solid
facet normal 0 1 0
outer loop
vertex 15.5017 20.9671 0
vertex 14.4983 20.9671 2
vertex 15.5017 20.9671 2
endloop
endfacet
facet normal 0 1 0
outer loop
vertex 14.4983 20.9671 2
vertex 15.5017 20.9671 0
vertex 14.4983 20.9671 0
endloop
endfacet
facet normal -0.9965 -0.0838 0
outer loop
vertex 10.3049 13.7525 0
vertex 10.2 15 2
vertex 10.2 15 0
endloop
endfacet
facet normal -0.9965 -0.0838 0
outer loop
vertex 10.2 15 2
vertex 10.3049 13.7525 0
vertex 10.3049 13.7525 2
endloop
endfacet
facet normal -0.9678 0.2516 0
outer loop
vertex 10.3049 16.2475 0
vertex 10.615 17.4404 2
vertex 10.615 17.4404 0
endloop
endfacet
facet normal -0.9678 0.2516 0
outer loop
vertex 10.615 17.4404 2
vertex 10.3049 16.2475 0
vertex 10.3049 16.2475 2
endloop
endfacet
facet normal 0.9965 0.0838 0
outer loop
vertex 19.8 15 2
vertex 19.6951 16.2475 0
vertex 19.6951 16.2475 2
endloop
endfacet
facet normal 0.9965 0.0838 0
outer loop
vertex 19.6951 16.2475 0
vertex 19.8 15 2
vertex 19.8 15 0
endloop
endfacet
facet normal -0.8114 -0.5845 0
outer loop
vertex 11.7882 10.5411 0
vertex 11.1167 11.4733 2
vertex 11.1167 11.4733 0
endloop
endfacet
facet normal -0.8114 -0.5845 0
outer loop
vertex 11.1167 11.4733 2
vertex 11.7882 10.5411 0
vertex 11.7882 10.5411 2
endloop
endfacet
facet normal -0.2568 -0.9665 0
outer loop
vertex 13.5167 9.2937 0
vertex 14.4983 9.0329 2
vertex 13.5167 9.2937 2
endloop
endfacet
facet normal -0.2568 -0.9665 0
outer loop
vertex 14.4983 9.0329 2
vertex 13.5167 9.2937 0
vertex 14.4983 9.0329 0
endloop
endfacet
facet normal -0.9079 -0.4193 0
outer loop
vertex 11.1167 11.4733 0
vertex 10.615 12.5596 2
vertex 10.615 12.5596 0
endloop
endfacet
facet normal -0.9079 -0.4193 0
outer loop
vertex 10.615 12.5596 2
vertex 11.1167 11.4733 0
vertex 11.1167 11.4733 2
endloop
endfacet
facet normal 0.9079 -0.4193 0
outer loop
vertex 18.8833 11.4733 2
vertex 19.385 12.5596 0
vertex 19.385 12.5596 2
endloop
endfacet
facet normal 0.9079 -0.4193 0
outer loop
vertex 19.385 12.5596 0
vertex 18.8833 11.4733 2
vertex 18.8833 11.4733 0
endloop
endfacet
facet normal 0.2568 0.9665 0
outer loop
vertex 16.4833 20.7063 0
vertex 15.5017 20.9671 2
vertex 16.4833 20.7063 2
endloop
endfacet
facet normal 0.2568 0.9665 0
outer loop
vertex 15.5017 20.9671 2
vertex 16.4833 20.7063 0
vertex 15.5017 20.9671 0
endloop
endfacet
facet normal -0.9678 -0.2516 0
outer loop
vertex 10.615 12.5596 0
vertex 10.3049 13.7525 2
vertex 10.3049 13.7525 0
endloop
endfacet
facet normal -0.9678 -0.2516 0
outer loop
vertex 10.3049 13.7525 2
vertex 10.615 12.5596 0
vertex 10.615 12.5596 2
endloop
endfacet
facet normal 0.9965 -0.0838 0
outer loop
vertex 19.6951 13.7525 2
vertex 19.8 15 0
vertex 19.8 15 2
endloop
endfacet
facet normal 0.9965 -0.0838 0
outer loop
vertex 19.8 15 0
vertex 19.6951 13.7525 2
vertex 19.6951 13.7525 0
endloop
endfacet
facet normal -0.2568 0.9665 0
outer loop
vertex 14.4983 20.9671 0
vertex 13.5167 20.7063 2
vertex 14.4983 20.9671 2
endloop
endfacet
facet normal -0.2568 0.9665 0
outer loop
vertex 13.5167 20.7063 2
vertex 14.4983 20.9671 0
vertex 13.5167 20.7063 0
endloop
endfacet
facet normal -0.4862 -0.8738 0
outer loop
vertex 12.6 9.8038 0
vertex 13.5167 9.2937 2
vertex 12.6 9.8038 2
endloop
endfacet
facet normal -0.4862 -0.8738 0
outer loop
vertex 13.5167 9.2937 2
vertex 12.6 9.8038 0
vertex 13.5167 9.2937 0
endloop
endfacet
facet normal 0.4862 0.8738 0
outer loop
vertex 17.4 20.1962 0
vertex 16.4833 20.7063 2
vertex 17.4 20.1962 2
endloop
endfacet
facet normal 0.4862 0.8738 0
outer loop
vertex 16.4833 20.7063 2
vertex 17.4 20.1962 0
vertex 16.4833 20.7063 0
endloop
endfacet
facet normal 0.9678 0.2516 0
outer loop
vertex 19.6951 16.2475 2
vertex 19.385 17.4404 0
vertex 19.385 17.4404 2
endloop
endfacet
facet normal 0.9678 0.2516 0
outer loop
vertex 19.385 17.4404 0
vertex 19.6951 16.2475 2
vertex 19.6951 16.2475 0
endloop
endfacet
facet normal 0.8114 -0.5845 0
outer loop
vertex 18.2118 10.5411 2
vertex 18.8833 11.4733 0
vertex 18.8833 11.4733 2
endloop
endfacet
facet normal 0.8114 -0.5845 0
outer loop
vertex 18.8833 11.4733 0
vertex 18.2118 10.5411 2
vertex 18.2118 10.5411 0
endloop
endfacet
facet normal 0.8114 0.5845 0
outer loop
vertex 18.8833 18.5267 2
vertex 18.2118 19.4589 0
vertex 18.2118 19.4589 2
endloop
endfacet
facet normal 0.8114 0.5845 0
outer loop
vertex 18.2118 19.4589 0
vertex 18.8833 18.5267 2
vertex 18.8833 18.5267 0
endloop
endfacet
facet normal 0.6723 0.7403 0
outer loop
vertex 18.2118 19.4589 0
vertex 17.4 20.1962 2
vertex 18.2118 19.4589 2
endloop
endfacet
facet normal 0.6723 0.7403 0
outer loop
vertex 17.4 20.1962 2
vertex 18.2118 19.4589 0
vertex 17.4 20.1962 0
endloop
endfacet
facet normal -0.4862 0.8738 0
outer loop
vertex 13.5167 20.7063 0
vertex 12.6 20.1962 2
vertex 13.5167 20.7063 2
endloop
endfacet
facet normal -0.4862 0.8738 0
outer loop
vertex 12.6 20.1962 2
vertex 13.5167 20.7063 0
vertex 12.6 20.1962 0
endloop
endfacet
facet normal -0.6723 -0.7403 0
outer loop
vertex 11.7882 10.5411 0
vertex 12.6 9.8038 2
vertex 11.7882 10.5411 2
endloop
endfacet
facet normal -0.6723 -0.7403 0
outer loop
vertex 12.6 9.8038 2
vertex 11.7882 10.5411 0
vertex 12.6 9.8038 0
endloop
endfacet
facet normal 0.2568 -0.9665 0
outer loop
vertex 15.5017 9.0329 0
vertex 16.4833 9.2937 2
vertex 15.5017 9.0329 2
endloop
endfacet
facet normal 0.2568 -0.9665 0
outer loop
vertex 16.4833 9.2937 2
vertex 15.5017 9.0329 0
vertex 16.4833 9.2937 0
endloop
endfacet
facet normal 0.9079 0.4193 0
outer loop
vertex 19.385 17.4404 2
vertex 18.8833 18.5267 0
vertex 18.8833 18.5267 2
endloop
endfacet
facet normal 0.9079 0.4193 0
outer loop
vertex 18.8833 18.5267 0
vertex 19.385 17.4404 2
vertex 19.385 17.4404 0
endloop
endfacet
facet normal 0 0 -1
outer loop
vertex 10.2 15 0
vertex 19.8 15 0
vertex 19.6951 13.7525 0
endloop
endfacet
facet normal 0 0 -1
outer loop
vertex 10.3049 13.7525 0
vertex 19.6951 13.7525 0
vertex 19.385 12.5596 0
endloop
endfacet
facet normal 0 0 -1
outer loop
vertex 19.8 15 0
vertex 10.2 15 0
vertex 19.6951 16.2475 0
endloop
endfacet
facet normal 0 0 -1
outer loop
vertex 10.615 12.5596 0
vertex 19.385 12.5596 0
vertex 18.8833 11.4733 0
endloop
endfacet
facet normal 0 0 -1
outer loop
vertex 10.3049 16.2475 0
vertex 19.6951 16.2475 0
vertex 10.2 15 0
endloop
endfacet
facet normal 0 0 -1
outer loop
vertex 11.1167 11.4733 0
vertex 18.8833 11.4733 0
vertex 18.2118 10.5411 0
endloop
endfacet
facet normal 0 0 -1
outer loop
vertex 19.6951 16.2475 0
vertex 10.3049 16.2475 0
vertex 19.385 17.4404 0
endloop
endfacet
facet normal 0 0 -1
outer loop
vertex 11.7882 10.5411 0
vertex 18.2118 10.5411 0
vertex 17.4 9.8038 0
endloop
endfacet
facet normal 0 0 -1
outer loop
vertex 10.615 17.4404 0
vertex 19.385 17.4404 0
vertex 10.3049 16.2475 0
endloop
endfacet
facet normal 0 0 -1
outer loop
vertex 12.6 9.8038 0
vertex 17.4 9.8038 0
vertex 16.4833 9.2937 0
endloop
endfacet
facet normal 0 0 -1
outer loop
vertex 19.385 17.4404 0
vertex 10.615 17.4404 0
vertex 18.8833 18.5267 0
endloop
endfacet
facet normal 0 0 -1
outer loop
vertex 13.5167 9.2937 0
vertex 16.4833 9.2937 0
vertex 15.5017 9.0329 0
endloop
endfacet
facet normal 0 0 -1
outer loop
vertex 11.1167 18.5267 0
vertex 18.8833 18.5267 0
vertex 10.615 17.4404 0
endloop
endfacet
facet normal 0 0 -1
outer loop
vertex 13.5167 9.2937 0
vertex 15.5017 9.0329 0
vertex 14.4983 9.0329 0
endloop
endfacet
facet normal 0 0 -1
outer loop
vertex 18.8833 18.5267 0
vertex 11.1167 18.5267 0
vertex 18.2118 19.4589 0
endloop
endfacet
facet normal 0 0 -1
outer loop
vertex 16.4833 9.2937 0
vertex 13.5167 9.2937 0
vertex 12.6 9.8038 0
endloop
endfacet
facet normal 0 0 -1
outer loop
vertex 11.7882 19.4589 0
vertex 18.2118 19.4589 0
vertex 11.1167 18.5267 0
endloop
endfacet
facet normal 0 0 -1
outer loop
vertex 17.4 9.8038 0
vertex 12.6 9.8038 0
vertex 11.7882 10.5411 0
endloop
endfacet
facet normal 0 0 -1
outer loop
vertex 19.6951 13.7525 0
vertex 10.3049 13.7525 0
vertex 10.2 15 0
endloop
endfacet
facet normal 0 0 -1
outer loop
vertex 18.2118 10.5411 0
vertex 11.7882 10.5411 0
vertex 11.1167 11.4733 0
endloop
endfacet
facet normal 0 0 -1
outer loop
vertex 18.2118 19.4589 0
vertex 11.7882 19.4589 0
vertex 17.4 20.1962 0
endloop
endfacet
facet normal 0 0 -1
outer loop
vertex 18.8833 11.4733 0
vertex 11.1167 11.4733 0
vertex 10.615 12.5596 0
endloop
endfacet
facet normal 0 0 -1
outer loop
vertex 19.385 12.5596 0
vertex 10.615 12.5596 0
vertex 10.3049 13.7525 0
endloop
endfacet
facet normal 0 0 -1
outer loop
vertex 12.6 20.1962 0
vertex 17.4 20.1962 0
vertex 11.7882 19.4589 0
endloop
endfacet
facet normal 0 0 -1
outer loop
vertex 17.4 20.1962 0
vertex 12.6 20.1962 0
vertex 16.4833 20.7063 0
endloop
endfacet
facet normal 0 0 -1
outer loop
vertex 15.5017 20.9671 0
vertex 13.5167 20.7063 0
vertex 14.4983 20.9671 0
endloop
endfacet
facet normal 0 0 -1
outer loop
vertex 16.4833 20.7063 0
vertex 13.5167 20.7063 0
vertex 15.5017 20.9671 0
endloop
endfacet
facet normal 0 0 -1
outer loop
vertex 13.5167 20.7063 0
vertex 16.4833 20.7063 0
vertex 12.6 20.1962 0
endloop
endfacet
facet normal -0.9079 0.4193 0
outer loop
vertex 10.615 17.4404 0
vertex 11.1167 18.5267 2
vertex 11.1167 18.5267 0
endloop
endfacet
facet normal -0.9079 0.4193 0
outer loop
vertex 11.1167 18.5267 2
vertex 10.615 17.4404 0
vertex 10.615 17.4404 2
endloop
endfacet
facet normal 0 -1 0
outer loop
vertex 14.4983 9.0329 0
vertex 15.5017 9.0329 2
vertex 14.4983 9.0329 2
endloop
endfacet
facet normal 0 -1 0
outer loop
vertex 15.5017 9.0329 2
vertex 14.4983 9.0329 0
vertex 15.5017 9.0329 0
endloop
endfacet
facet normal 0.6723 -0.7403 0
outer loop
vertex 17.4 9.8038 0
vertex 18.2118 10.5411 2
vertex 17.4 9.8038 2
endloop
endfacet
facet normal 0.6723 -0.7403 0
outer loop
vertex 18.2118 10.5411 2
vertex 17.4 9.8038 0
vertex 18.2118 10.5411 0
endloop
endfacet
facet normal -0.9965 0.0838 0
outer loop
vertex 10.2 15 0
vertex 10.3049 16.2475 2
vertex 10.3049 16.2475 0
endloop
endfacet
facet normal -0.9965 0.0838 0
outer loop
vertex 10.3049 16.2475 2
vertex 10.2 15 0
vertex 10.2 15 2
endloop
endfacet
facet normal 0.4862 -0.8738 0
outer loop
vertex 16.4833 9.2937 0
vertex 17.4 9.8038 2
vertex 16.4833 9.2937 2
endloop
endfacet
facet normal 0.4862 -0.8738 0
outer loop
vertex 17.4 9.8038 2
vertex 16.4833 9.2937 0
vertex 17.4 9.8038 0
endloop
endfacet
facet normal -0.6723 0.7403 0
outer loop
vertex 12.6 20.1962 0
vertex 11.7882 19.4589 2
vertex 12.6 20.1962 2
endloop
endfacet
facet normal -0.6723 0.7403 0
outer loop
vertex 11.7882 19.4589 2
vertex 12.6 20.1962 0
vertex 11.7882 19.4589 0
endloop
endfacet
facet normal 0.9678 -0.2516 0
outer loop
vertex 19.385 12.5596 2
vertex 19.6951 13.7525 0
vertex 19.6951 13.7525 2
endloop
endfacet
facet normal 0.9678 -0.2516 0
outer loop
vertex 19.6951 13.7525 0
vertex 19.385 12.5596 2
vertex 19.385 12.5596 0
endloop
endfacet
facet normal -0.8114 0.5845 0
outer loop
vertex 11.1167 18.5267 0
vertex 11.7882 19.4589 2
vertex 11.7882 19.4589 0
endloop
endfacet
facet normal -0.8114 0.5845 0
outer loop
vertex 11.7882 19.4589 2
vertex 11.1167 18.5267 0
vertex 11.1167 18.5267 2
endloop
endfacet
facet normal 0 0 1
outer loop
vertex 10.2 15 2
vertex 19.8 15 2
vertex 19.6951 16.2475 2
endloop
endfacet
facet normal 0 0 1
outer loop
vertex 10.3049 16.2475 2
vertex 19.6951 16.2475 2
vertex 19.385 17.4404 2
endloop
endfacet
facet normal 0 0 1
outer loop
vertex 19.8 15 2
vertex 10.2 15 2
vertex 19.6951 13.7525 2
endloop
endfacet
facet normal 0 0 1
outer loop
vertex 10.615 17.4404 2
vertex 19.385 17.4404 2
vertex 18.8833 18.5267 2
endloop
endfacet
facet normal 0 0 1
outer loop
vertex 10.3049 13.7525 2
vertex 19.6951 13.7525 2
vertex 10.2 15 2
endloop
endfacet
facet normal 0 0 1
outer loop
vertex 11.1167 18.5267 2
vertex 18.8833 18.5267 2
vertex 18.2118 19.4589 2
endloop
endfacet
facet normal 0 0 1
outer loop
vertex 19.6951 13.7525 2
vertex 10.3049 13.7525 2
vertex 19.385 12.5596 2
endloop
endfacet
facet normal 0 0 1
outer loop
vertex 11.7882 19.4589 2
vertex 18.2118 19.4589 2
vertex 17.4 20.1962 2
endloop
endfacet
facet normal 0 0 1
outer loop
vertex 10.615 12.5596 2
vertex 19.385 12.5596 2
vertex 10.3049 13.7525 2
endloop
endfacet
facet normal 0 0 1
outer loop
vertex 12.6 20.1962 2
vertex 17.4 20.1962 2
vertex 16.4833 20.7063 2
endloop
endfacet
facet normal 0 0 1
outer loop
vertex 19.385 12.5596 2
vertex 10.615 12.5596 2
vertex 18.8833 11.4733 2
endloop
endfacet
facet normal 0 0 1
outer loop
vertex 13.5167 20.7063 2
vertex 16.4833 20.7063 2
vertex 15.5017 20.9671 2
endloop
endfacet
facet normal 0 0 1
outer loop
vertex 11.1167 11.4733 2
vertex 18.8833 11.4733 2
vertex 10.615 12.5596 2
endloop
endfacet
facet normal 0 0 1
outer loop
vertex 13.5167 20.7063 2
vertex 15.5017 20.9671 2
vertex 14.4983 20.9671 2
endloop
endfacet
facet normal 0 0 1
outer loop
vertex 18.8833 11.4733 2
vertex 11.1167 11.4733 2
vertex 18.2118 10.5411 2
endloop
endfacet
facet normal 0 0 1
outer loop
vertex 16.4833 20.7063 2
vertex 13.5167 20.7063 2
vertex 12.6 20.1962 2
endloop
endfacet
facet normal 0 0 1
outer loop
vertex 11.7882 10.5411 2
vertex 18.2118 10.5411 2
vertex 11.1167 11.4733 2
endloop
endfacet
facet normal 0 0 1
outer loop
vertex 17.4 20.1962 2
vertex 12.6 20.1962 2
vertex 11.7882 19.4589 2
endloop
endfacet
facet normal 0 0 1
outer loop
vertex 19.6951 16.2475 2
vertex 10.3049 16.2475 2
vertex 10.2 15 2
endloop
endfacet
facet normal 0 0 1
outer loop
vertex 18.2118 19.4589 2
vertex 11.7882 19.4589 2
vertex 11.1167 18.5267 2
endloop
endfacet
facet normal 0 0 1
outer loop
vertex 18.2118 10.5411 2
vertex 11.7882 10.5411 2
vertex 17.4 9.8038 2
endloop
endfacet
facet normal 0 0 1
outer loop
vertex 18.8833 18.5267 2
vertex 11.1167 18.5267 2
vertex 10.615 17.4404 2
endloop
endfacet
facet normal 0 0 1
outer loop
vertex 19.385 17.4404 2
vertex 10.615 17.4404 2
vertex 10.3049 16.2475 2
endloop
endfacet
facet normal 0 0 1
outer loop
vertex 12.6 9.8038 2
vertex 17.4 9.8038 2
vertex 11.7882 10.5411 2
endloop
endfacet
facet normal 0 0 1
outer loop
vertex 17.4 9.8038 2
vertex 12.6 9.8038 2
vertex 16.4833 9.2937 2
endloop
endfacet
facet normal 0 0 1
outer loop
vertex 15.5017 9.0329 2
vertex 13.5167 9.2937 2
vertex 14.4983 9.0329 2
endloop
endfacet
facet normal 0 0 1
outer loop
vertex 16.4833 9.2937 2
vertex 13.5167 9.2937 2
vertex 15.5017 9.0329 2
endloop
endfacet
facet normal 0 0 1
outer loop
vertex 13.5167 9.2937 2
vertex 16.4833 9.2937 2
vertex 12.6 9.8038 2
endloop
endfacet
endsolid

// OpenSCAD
// easter rabbit from a drawing


lapin_png="lapin.png";  // nom du fichier image. Changer d'image, y compris sa dimension requiert des règlages dans les modules lapin_part() 
lapin_couleur="red"; // couleur du lapin
lapin_echelle=0.30; // 1 = 100%
larg_baguette=7;     // largeur de la baguette = 7mm
base_hauteur_oeil=2;    // épaisseur base de support oeil
base_hauteur_corps=larg_baguette +2*base_hauteur_oeil;  // épaisseur base de support du corps


/*
 * module lapin_part()
 * dessine le lapin depuis l'image, avec un support pour l'oeil, et sans le socle généré par l'image
 * changer l'image nécessite de régler la suppression du socle image
 *
 */
module lapin_part() {
    // lapin sans le socle de l'image
    difference() {
        color(lapin_couleur)
            translate([0,0,9])
                scale([1,1,0.1])
                    surface(file = lapin_png, center = true, invert = true);
        translate([0,0,-3])
            cube([220,300,6], center=true); // supprimer socle généré
    }
    // support oeil
    color(lapin_couleur)
        translate([50,50,0]) 
            linear_extrude(base_hauteur_oeil) 
                scale([0.80,1,0]) circle(r=20);
    // support corps
    /** remplacé par une partie d'image en plein
    translate([-13,-59,0])
        linear_extrude(base_hauteur_corps) 
            scale([0.80,1,0]) circle(r=30);    
    translate([-12,-59,0])
        linear_extrude(base_hauteur_oeil) 
            circle(r=47);
    **/
}

/*
 * module fixation_hole(YPosition, aYHauteur)
 * Ce module réalise le perçage (par différence avec module fixation_part) pour permettre de fixer l'impression sur une baguette
 * aXPosition : Position du trou
 * aYPosition : Position du trou
 * aYHauteur : Hauteur du trou
 *
 */
module fixation_hole(aXPosition, aYPosition, aYHauteur) {
    epsilon=0.2; // marge de jeu
    translate([aXPosition,aYPosition,base_hauteur_oeil/2+larg_baguette/2+epsilon/2])
            cube([larg_baguette+epsilon,aYHauteur,larg_baguette+epsilon],center=true);
}

/*
 * module main_assembly()
 * assemblage final lapin mis à l'échelle + fixation
 * dans cette version, pas de fixation_support supplémentaire
 */
module main_assembly() {
    difference() {
        scale([lapin_echelle,lapin_echelle,1]) lapin_part();
        fixation_hole(aXPosition=-(larg_baguette)/2,aYPosition=-80*lapin_echelle, aYHauteur=64*lapin_echelle);    
    }
}
/* ------------------------------- */
// scale([lapin_echelle,lapin_echelle,1]) lapin_part();
main_assembly();
